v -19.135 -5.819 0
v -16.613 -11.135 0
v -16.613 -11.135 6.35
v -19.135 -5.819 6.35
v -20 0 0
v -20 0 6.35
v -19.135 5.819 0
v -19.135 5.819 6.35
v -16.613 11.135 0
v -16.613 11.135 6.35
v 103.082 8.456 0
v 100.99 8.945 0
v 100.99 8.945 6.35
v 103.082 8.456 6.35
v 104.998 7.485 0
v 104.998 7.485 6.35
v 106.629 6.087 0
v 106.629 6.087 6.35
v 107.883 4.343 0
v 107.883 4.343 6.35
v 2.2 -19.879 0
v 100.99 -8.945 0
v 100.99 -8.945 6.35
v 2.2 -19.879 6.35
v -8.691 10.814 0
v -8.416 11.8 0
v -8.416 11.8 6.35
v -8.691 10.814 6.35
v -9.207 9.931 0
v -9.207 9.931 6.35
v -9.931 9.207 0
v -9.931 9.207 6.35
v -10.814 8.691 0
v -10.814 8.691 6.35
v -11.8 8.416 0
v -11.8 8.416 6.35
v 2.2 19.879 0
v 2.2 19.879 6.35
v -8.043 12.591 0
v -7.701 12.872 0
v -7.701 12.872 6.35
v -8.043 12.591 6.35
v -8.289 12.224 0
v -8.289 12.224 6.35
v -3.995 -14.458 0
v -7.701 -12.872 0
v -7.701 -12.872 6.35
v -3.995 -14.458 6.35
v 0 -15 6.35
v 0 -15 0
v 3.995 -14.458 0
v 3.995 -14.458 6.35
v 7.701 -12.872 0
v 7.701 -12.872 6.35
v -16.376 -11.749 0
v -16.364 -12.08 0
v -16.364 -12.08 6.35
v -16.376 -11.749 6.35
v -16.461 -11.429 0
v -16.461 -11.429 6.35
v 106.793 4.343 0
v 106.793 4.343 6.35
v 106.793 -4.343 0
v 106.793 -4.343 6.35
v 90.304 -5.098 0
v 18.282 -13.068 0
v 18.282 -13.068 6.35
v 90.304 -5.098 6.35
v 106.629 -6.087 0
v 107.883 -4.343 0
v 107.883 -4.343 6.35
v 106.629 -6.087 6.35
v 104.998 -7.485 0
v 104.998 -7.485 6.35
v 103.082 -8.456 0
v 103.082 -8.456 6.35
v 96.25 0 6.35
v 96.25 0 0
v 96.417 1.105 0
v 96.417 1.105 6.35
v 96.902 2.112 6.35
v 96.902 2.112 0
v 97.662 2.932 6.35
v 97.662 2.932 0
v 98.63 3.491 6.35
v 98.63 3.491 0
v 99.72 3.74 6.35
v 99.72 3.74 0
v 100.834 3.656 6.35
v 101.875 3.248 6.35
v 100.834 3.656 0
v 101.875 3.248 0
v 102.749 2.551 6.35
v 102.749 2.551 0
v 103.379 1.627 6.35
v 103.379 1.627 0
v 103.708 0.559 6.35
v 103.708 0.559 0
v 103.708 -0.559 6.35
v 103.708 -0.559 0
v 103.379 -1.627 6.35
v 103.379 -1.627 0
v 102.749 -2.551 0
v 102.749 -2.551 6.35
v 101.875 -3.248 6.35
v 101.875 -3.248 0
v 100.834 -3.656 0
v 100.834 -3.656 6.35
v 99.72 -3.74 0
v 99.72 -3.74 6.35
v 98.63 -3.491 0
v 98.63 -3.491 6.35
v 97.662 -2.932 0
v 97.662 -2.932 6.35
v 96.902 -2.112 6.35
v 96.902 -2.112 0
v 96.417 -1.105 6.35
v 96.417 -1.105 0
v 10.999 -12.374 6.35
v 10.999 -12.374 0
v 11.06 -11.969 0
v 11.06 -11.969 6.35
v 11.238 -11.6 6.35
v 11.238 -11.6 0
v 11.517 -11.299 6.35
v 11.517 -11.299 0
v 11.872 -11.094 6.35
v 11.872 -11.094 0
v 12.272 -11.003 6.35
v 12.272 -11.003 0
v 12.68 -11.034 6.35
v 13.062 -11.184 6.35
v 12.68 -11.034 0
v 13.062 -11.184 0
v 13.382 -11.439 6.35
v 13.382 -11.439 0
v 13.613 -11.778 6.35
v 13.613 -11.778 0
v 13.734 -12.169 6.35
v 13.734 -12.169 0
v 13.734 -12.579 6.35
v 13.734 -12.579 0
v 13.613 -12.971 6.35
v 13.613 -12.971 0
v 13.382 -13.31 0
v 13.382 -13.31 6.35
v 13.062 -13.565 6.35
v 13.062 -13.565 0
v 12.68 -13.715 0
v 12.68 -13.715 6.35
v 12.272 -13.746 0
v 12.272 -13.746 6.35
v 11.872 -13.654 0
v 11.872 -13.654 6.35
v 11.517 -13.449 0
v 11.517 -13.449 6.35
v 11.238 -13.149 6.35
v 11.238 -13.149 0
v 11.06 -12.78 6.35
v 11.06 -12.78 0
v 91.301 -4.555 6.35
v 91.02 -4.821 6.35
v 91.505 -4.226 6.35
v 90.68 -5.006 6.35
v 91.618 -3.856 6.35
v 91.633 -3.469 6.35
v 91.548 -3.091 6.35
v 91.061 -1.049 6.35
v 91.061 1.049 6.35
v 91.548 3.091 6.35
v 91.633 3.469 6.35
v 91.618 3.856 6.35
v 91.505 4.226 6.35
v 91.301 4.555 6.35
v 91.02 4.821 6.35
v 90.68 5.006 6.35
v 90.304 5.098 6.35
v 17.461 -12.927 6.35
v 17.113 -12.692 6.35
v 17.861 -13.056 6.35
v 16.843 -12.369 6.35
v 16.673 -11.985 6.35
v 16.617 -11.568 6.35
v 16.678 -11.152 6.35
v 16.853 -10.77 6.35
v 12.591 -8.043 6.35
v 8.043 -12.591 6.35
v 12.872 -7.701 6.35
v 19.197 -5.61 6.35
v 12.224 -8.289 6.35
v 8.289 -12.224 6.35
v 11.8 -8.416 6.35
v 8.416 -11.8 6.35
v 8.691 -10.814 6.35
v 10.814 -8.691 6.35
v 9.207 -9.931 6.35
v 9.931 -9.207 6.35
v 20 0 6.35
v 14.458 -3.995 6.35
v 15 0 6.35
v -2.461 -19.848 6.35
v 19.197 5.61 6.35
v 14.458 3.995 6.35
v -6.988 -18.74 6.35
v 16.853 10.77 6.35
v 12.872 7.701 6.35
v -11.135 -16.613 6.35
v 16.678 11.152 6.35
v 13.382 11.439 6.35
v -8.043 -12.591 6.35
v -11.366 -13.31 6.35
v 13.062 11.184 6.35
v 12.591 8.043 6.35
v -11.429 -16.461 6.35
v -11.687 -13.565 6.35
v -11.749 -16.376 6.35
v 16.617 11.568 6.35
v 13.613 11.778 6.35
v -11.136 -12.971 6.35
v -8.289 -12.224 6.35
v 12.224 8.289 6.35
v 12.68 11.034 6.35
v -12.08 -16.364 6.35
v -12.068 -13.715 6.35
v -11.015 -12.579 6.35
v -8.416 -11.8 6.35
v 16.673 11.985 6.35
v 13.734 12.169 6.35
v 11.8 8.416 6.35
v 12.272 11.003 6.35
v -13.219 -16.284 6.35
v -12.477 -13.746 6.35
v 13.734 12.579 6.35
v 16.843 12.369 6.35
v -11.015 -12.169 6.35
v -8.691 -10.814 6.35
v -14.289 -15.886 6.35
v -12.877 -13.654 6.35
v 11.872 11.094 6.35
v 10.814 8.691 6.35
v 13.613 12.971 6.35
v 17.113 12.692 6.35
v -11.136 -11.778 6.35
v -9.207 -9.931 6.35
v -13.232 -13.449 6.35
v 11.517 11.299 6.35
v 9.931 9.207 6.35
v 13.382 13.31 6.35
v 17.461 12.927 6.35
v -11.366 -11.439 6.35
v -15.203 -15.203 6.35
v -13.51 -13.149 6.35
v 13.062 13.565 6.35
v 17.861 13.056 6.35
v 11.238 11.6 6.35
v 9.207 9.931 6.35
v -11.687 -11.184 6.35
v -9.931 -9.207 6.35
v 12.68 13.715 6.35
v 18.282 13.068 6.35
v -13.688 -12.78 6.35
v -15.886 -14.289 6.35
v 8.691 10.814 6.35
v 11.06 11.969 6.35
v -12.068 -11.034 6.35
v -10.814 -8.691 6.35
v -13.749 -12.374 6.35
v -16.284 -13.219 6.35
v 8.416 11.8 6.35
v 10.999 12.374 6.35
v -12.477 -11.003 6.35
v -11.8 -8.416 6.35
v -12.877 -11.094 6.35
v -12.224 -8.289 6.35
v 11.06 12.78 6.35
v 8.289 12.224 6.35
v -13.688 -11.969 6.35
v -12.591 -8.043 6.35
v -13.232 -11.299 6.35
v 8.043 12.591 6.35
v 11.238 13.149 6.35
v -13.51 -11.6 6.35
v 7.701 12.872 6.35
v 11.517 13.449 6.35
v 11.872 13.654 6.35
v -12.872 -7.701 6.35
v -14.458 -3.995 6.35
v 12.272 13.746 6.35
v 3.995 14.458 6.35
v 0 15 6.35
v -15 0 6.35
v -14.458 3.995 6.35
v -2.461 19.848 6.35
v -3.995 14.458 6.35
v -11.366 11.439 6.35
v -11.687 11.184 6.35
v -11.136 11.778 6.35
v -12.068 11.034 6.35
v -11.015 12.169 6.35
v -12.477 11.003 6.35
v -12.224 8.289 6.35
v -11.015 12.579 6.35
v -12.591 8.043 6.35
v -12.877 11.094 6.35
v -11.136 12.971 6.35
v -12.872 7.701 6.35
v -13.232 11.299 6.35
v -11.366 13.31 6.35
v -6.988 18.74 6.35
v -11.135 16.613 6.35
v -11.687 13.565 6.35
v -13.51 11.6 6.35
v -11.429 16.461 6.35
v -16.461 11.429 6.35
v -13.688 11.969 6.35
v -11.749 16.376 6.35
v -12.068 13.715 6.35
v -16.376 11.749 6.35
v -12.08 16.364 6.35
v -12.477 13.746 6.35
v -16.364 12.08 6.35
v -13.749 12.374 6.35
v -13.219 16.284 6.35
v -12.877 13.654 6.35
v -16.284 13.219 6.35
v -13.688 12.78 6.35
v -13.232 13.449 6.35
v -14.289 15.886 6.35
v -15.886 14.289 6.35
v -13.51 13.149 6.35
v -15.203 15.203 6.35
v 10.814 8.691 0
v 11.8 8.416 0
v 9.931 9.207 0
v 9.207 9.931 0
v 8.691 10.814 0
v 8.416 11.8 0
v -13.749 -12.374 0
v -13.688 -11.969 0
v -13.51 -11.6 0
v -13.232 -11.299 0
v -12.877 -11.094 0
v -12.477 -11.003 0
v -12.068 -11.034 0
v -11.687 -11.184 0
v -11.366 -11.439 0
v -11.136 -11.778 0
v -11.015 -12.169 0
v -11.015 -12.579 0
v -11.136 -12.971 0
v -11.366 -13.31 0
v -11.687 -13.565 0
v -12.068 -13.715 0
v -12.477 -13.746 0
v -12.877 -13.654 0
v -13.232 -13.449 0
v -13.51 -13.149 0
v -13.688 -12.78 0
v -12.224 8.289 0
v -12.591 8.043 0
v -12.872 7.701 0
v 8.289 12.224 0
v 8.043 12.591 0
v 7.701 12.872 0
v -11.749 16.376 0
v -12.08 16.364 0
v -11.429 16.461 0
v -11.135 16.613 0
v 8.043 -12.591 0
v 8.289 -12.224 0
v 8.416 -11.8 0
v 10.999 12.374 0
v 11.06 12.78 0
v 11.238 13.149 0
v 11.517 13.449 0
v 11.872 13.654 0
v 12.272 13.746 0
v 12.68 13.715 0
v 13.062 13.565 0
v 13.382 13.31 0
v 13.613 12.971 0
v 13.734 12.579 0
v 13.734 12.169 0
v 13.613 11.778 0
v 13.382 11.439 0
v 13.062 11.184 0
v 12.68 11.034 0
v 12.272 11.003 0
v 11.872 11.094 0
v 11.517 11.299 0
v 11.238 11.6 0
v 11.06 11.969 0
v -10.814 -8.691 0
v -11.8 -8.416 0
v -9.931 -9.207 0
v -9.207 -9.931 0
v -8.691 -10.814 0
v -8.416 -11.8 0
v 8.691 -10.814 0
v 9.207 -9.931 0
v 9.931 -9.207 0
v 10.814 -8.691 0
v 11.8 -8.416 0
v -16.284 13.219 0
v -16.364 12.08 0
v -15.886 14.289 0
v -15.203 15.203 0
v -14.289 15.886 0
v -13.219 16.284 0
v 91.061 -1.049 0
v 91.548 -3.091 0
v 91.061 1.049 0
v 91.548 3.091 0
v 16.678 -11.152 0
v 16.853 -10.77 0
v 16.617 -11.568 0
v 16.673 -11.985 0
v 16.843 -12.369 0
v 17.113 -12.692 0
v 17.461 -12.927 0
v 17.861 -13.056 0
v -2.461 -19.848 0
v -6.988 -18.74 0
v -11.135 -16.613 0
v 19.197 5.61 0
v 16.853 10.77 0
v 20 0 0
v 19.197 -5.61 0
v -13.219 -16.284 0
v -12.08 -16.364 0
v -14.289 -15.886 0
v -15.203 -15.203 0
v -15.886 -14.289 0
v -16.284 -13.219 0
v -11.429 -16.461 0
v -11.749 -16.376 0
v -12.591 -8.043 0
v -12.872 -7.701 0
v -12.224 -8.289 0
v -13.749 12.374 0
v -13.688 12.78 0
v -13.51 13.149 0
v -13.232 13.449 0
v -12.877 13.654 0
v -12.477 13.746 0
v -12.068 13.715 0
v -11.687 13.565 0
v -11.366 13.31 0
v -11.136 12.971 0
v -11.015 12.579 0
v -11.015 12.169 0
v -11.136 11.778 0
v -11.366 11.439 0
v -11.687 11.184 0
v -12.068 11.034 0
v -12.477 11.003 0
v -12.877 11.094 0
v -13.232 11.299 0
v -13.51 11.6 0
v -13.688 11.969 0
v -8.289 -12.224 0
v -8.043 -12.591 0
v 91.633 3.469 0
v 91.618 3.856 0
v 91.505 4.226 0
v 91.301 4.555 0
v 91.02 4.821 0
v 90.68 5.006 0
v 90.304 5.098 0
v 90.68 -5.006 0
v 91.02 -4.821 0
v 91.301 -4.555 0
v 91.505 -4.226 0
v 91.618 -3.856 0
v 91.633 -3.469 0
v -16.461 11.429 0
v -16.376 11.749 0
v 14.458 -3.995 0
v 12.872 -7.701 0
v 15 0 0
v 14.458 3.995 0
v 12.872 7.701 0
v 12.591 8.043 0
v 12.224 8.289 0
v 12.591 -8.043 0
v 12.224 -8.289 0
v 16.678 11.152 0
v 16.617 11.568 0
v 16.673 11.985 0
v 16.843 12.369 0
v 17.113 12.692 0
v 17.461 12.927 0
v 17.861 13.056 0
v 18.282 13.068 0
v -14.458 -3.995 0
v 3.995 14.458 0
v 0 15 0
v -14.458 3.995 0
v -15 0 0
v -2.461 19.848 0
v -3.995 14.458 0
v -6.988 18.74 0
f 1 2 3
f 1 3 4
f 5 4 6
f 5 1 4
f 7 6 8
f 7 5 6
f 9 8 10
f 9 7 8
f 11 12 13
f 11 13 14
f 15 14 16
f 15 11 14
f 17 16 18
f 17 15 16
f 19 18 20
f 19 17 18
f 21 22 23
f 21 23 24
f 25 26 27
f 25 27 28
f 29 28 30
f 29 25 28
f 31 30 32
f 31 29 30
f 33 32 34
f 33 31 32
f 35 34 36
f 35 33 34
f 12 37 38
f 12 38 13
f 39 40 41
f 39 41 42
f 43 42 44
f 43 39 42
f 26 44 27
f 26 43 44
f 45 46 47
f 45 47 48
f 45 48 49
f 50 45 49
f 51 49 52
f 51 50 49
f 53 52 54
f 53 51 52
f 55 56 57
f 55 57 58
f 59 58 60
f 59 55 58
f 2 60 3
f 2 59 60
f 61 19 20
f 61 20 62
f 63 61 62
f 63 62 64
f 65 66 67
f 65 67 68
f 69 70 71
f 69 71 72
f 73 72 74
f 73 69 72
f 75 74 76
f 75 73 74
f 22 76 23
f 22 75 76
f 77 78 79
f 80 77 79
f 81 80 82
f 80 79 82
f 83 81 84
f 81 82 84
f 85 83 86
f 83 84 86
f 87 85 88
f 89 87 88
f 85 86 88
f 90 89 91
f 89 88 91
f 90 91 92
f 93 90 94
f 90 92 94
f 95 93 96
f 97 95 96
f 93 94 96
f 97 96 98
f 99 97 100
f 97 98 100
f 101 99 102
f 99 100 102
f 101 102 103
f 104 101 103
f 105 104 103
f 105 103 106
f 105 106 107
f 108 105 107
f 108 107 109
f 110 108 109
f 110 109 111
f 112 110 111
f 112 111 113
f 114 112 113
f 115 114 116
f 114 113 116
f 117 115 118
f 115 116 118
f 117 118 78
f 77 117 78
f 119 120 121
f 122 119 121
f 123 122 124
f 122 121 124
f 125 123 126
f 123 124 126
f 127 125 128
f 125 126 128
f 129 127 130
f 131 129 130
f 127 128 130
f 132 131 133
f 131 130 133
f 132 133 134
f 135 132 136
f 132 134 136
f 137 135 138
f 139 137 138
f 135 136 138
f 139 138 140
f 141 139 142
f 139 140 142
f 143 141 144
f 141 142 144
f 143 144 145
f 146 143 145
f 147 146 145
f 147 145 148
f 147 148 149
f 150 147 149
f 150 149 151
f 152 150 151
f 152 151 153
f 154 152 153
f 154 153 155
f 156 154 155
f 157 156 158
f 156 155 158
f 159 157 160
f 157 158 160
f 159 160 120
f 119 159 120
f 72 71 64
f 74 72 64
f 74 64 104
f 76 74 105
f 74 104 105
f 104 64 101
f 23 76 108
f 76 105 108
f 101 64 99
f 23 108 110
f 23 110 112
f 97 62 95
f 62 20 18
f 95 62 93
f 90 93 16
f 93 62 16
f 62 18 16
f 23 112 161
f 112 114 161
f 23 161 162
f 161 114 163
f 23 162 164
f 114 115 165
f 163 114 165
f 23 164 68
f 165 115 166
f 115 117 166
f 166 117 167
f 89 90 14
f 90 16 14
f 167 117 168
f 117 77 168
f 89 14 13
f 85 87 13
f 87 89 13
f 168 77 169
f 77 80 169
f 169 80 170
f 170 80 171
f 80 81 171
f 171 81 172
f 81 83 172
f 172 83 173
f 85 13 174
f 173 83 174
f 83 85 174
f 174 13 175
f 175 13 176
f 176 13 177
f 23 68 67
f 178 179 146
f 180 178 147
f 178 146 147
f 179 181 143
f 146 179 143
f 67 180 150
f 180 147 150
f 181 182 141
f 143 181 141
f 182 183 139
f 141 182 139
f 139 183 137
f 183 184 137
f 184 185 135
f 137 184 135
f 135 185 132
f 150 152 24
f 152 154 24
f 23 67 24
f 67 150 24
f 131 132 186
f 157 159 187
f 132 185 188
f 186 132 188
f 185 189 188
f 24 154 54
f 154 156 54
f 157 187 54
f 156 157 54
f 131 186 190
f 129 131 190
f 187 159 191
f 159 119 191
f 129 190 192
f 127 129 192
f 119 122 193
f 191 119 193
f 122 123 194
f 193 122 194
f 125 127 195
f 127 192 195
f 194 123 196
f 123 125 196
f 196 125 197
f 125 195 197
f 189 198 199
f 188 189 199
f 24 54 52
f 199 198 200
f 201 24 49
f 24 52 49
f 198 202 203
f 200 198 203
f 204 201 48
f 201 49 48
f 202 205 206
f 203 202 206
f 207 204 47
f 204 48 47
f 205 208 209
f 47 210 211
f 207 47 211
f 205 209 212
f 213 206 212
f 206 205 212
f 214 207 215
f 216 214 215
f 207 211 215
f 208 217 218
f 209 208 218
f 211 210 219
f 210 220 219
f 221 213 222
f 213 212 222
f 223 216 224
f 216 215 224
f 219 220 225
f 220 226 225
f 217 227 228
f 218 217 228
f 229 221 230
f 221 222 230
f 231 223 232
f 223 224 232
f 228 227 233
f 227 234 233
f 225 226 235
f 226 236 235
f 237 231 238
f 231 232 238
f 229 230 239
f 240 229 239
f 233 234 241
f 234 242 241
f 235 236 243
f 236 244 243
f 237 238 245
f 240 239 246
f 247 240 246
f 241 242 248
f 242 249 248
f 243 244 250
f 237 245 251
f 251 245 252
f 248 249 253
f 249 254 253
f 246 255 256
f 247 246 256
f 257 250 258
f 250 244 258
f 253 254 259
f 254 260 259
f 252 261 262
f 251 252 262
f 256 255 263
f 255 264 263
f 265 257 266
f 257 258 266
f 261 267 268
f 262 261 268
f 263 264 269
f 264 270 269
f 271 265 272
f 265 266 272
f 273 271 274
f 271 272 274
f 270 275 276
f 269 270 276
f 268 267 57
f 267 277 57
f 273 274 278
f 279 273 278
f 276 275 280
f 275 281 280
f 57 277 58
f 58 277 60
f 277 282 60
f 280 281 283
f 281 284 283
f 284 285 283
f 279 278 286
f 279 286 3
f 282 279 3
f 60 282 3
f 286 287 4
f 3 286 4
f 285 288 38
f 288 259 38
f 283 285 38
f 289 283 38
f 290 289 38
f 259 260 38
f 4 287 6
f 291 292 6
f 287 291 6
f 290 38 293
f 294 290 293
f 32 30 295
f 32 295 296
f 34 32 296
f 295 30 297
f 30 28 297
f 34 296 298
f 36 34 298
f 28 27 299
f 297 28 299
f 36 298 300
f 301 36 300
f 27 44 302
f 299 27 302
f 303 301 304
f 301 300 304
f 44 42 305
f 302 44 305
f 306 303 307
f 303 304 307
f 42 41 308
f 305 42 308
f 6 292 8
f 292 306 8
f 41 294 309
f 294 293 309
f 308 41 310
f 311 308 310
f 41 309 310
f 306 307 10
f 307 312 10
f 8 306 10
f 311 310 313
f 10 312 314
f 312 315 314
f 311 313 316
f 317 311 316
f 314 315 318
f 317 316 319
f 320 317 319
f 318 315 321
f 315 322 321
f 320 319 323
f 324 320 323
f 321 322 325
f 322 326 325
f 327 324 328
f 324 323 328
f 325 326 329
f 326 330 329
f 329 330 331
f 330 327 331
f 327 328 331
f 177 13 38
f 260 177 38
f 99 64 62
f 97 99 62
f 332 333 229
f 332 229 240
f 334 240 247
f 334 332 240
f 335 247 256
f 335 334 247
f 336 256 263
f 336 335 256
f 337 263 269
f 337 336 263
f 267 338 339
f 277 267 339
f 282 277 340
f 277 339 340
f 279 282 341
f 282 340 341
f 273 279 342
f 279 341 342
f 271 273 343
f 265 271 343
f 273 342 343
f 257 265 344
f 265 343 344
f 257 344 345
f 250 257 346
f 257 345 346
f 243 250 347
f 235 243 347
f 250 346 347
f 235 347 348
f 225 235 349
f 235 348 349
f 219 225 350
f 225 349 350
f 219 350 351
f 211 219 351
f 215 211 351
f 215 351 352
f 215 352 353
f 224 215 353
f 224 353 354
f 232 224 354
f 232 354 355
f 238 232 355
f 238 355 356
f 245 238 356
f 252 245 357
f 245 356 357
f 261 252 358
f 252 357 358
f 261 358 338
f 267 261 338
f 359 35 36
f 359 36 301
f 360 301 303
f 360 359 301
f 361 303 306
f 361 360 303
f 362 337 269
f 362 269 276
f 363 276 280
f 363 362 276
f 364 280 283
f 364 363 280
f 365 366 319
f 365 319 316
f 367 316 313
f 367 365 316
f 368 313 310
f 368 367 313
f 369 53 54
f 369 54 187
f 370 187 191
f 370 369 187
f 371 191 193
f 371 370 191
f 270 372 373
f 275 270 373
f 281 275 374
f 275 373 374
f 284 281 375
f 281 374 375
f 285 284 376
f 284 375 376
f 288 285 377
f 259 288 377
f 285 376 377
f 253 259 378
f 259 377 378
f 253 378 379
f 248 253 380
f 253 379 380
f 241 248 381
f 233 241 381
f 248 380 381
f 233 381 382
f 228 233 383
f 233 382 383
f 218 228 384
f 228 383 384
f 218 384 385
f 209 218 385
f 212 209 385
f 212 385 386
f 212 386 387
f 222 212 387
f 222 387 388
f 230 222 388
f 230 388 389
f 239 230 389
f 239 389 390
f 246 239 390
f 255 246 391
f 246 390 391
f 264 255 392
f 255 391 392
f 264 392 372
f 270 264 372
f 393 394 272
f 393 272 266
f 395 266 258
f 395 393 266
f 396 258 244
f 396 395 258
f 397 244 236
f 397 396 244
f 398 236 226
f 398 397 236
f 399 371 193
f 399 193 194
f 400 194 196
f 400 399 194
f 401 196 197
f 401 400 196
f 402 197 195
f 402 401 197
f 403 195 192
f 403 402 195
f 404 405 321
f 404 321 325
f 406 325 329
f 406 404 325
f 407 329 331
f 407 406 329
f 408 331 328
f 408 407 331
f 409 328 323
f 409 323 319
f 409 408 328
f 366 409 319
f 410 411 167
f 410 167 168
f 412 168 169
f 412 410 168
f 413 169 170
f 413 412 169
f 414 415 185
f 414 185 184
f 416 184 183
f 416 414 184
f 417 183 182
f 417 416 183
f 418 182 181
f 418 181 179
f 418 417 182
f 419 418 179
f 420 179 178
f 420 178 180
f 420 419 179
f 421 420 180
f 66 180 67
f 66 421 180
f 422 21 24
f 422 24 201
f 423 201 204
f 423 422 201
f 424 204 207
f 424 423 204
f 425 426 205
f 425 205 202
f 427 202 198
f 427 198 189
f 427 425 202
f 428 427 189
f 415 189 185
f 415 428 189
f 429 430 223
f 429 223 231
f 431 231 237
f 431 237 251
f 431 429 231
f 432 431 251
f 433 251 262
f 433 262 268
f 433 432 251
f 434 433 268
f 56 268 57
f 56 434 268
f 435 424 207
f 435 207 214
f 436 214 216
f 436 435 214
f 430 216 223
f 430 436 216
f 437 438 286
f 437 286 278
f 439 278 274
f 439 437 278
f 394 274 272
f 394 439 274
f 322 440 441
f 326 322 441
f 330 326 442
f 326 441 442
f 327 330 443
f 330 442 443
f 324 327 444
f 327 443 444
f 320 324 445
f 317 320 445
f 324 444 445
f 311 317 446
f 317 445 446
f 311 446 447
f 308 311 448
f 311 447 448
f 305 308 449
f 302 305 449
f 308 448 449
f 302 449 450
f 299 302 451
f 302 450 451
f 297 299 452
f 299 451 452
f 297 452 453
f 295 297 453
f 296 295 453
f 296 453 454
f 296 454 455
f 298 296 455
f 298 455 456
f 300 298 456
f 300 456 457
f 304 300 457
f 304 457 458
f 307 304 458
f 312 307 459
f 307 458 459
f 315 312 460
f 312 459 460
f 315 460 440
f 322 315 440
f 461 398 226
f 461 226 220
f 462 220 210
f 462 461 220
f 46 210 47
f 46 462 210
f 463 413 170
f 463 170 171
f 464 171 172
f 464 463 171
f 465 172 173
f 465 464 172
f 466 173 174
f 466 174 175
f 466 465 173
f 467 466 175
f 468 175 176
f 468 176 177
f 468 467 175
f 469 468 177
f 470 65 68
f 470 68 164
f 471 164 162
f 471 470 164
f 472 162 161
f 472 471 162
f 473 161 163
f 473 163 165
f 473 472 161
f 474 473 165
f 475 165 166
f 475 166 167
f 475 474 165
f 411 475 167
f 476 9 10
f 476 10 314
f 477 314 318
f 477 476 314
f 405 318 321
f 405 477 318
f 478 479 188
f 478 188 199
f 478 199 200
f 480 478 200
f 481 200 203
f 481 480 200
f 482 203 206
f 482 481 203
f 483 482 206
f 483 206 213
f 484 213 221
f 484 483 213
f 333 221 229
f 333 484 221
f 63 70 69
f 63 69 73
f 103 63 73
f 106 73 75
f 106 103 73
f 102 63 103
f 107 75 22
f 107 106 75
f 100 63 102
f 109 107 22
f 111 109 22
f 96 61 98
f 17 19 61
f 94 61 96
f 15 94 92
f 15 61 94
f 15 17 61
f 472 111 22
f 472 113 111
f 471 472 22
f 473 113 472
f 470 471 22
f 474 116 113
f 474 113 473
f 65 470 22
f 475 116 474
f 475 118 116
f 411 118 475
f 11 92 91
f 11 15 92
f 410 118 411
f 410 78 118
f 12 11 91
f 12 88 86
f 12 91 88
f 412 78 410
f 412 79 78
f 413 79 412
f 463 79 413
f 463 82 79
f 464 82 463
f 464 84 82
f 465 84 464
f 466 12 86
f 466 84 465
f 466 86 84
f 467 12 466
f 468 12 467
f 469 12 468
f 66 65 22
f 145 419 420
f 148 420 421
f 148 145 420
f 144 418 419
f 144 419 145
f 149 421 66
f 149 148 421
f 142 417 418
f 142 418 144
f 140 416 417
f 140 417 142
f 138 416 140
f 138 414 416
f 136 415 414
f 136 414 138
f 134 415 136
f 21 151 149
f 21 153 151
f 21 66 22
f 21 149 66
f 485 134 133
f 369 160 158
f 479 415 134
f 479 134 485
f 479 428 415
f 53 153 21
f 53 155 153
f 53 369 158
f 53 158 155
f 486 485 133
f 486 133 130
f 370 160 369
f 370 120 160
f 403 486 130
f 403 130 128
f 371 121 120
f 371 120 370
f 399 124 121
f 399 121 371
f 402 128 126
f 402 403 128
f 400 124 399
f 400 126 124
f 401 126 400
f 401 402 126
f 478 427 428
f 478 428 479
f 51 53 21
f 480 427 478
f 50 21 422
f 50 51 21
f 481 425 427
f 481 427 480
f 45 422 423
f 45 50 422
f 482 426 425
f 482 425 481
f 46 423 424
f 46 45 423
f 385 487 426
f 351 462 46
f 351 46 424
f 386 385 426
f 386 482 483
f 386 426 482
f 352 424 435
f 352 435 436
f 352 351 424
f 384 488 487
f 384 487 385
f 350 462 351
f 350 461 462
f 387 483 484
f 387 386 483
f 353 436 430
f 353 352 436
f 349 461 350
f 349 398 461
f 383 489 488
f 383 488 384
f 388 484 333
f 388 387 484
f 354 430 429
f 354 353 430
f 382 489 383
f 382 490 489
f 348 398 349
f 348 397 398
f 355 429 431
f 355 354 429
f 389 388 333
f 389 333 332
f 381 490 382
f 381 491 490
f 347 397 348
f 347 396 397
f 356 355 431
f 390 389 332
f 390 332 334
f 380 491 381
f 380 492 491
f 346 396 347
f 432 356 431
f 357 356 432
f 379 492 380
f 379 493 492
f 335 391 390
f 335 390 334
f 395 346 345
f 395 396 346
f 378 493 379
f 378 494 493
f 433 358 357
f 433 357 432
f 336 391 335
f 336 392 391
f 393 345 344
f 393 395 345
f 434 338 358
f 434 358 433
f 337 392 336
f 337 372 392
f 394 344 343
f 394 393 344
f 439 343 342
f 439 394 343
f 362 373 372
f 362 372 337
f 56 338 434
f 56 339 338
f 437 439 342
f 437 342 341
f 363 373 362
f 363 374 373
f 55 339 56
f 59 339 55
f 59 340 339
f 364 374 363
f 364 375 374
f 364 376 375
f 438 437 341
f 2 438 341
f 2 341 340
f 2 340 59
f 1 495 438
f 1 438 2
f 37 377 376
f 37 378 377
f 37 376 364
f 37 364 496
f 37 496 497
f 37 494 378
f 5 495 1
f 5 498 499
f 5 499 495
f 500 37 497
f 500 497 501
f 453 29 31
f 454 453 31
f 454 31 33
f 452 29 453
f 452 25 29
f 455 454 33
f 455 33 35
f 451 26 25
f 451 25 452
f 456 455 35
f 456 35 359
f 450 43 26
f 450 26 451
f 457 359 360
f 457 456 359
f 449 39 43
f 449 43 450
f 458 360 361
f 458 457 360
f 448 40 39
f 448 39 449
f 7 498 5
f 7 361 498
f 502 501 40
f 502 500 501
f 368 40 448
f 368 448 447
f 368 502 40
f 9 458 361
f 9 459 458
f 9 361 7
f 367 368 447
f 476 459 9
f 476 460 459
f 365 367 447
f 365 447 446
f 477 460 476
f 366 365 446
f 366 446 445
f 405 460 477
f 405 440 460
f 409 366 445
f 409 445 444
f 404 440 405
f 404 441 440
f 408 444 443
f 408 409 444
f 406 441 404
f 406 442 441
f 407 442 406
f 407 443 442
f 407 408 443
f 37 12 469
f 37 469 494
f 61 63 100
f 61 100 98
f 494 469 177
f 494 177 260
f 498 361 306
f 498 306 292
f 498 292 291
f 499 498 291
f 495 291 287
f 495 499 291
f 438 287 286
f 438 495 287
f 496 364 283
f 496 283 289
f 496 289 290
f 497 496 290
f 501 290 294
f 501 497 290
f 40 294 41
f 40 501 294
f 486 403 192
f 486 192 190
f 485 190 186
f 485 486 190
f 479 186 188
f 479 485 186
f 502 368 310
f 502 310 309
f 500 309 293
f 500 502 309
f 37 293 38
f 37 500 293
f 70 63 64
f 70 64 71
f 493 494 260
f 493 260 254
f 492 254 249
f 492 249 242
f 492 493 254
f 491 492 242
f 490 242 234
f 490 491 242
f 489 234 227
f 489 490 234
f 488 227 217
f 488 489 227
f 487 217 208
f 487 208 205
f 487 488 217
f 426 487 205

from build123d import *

# Parameters (mm, degrees)
SKETCH1_R           = 3.75
SKETCH1_R_2         = 1.375
BOSS_EXTRUDE1_DEPTH = 6.35


with BuildPart() as part:
    # Sketch1 → Boss-Extrude1 (new body)
    with BuildSketch(Plane(origin=(0, 0, 0), x_dir=(-1, 0, 0), z_dir=(0, 0, -1))):
        with BuildLine():
            Line((-106.79268786, -4.343029528), (-107.882772007, -4.343029528))
            ThreePointArc((-107.882772007, -4.343029528), (-104.997693278, -7.484855503), (-100.99, -8.945384285))
            Line((-100.99, -8.945384285), (-2.2, -19.878631744))
            ThreePointArc((-2.2, -19.878631744), (4.756528256, -19.426153478), (11.135161851, -16.613493629))
            ThreePointArc((11.135161851, -16.613493629), (11.586893238, -16.409333237), (12.080499812, -16.363559202))
            ThreePointArc((12.080499812, -16.363559202), (15.202795796, -15.202795795), (16.363559202, -12.080499812))
            ThreePointArc((16.363559202, -12.080499812), (16.409333237, -11.586893238), (16.613493629, -11.135161851))
            ThreePointArc((16.613493629, -11.135161851), (20, 0), (16.613493629, 11.135161851))
            ThreePointArc((16.613493629, 11.135161851), (16.409333237, 11.586893238), (16.363559202, 12.080499812))
            ThreePointArc((16.363559202, 12.080499812), (15.202795795, 15.202795795), (12.080499812, 16.363559202))
            ThreePointArc((12.080499812, 16.363559202), (11.586893238, 16.409333237), (11.135161851, 16.613493629))
            ThreePointArc((11.135161851, 16.613493629), (4.756528256, 19.426153478), (-2.2, 19.878631744))
            Line((-2.2, 19.878631744), (-100.99, 8.945384285))
            ThreePointArc((-100.99, 8.945384285), (-104.997693278, 7.484855504), (-107.882772007, 4.343029529))
            Line((-107.882772007, 4.343029529), (-106.79268786, 4.343029529))
            Line((-106.79268786, 4.343029529), (-106.79268786, -4.343029528))
        make_face()
        with Locations((-100, 0)):
            Circle(SKETCH1_R, mode=Mode.SUBTRACT)
        with Locations((12.374368671, -12.374368671)):
            Circle(SKETCH1_R_2, mode=Mode.SUBTRACT)
        with Locations((12.374368671, 12.374368671)):
            Circle(SKETCH1_R_2, mode=Mode.SUBTRACT)
        with Locations((-12.374368671, 12.374368671)):
            Circle(SKETCH1_R_2, mode=Mode.SUBTRACT)
        with Locations((-12.374368671, -12.374368671)):
            Circle(SKETCH1_R_2, mode=Mode.SUBTRACT)
        with BuildLine():
            Line((-18.281656562, -13.06832175), (-90.303846884, -5.097510642))
            ThreePointArc((-90.303846884, -5.097510642), (-91.413718881, -4.396993797), (-91.547583043, -3.091382795))
            ThreePointArc((-91.547583043, -3.091382795), (-91, 0), (-91.547583043, 3.091382796))
            ThreePointArc((-91.547583043, 3.091382796), (-91.413718881, 4.396993797), (-90.303846884, 5.097510642))
            Line((-90.303846884, 5.097510642), (-18.281656562, 13.068321749))
            ThreePointArc((-18.281656562, 13.068321749), (-16.842747955, 12.369356727), (-16.852703779, 10.769697087))
            ThreePointArc((-16.852703779, 10.769697087), (-20, 0), (-16.852703779, -10.769697087))
            ThreePointArc((-16.852703779, -10.769697087), (-16.842747955, -12.369356727), (-18.281656562, -13.06832175))
        make_face(mode=Mode.SUBTRACT)
        with BuildLine():
            ThreePointArc((-11.80010118, -8.415806198), (-12.416598495, -8.179555802), (-12.871945412, -7.701494746))
            ThreePointArc((-12.871945412, -7.701494746), (-15, 0), (-12.871945412, 7.701494746))
            ThreePointArc((-12.871945412, 7.701494746), (-12.416598495, 8.179555802), (-11.80010118, 8.415806198))
            ThreePointArc((-11.80010118, 8.415806198), (-9.545941546, 9.545941546), (-8.415806198, 11.80010118))
            ThreePointArc((-8.415806198, 11.80010118), (-8.179555802, 12.416598495), (-7.701494746, 12.871945412))
            ThreePointArc((-7.701494746, 12.871945412), (0, 15), (7.701494746, 12.871945412))
            ThreePointArc((7.701494746, 12.871945412), (8.179555802, 12.416598495), (8.415806198, 11.80010118))
            ThreePointArc((8.415806198, 11.80010118), (9.545941546, 9.545941546), (11.80010118, 8.415806198))
            ThreePointArc((11.80010118, 8.415806198), (12.416598495, 8.179555802), (12.871945412, 7.701494746))
            ThreePointArc((12.871945412, 7.701494746), (15, 0), (12.871945412, -7.701494746))
            ThreePointArc((12.871945412, -7.701494746), (12.416598495, -8.179555803), (11.80010118, -8.415806198))
            ThreePointArc((11.80010118, -8.415806198), (9.545941546, -9.545941546), (8.415806198, -11.80010118))
            ThreePointArc((8.415806198, -11.80010118), (8.179555803, -12.416598495), (7.701494746, -12.871945412))
            ThreePointArc((7.701494746, -12.871945412), (0, -15), (-7.701494746, -12.871945412))
            ThreePointArc((-7.701494746, -12.871945412), (-8.179555802, -12.416598495), (-8.415806198, -11.80010118))
            ThreePointArc((-8.415806198, -11.80010118), (-9.545941546, -9.545941546), (-11.80010118, -8.415806198))
        make_face(mode=Mode.SUBTRACT)
    extrude(amount=-BOSS_EXTRUDE1_DEPTH)


solid = part.part
